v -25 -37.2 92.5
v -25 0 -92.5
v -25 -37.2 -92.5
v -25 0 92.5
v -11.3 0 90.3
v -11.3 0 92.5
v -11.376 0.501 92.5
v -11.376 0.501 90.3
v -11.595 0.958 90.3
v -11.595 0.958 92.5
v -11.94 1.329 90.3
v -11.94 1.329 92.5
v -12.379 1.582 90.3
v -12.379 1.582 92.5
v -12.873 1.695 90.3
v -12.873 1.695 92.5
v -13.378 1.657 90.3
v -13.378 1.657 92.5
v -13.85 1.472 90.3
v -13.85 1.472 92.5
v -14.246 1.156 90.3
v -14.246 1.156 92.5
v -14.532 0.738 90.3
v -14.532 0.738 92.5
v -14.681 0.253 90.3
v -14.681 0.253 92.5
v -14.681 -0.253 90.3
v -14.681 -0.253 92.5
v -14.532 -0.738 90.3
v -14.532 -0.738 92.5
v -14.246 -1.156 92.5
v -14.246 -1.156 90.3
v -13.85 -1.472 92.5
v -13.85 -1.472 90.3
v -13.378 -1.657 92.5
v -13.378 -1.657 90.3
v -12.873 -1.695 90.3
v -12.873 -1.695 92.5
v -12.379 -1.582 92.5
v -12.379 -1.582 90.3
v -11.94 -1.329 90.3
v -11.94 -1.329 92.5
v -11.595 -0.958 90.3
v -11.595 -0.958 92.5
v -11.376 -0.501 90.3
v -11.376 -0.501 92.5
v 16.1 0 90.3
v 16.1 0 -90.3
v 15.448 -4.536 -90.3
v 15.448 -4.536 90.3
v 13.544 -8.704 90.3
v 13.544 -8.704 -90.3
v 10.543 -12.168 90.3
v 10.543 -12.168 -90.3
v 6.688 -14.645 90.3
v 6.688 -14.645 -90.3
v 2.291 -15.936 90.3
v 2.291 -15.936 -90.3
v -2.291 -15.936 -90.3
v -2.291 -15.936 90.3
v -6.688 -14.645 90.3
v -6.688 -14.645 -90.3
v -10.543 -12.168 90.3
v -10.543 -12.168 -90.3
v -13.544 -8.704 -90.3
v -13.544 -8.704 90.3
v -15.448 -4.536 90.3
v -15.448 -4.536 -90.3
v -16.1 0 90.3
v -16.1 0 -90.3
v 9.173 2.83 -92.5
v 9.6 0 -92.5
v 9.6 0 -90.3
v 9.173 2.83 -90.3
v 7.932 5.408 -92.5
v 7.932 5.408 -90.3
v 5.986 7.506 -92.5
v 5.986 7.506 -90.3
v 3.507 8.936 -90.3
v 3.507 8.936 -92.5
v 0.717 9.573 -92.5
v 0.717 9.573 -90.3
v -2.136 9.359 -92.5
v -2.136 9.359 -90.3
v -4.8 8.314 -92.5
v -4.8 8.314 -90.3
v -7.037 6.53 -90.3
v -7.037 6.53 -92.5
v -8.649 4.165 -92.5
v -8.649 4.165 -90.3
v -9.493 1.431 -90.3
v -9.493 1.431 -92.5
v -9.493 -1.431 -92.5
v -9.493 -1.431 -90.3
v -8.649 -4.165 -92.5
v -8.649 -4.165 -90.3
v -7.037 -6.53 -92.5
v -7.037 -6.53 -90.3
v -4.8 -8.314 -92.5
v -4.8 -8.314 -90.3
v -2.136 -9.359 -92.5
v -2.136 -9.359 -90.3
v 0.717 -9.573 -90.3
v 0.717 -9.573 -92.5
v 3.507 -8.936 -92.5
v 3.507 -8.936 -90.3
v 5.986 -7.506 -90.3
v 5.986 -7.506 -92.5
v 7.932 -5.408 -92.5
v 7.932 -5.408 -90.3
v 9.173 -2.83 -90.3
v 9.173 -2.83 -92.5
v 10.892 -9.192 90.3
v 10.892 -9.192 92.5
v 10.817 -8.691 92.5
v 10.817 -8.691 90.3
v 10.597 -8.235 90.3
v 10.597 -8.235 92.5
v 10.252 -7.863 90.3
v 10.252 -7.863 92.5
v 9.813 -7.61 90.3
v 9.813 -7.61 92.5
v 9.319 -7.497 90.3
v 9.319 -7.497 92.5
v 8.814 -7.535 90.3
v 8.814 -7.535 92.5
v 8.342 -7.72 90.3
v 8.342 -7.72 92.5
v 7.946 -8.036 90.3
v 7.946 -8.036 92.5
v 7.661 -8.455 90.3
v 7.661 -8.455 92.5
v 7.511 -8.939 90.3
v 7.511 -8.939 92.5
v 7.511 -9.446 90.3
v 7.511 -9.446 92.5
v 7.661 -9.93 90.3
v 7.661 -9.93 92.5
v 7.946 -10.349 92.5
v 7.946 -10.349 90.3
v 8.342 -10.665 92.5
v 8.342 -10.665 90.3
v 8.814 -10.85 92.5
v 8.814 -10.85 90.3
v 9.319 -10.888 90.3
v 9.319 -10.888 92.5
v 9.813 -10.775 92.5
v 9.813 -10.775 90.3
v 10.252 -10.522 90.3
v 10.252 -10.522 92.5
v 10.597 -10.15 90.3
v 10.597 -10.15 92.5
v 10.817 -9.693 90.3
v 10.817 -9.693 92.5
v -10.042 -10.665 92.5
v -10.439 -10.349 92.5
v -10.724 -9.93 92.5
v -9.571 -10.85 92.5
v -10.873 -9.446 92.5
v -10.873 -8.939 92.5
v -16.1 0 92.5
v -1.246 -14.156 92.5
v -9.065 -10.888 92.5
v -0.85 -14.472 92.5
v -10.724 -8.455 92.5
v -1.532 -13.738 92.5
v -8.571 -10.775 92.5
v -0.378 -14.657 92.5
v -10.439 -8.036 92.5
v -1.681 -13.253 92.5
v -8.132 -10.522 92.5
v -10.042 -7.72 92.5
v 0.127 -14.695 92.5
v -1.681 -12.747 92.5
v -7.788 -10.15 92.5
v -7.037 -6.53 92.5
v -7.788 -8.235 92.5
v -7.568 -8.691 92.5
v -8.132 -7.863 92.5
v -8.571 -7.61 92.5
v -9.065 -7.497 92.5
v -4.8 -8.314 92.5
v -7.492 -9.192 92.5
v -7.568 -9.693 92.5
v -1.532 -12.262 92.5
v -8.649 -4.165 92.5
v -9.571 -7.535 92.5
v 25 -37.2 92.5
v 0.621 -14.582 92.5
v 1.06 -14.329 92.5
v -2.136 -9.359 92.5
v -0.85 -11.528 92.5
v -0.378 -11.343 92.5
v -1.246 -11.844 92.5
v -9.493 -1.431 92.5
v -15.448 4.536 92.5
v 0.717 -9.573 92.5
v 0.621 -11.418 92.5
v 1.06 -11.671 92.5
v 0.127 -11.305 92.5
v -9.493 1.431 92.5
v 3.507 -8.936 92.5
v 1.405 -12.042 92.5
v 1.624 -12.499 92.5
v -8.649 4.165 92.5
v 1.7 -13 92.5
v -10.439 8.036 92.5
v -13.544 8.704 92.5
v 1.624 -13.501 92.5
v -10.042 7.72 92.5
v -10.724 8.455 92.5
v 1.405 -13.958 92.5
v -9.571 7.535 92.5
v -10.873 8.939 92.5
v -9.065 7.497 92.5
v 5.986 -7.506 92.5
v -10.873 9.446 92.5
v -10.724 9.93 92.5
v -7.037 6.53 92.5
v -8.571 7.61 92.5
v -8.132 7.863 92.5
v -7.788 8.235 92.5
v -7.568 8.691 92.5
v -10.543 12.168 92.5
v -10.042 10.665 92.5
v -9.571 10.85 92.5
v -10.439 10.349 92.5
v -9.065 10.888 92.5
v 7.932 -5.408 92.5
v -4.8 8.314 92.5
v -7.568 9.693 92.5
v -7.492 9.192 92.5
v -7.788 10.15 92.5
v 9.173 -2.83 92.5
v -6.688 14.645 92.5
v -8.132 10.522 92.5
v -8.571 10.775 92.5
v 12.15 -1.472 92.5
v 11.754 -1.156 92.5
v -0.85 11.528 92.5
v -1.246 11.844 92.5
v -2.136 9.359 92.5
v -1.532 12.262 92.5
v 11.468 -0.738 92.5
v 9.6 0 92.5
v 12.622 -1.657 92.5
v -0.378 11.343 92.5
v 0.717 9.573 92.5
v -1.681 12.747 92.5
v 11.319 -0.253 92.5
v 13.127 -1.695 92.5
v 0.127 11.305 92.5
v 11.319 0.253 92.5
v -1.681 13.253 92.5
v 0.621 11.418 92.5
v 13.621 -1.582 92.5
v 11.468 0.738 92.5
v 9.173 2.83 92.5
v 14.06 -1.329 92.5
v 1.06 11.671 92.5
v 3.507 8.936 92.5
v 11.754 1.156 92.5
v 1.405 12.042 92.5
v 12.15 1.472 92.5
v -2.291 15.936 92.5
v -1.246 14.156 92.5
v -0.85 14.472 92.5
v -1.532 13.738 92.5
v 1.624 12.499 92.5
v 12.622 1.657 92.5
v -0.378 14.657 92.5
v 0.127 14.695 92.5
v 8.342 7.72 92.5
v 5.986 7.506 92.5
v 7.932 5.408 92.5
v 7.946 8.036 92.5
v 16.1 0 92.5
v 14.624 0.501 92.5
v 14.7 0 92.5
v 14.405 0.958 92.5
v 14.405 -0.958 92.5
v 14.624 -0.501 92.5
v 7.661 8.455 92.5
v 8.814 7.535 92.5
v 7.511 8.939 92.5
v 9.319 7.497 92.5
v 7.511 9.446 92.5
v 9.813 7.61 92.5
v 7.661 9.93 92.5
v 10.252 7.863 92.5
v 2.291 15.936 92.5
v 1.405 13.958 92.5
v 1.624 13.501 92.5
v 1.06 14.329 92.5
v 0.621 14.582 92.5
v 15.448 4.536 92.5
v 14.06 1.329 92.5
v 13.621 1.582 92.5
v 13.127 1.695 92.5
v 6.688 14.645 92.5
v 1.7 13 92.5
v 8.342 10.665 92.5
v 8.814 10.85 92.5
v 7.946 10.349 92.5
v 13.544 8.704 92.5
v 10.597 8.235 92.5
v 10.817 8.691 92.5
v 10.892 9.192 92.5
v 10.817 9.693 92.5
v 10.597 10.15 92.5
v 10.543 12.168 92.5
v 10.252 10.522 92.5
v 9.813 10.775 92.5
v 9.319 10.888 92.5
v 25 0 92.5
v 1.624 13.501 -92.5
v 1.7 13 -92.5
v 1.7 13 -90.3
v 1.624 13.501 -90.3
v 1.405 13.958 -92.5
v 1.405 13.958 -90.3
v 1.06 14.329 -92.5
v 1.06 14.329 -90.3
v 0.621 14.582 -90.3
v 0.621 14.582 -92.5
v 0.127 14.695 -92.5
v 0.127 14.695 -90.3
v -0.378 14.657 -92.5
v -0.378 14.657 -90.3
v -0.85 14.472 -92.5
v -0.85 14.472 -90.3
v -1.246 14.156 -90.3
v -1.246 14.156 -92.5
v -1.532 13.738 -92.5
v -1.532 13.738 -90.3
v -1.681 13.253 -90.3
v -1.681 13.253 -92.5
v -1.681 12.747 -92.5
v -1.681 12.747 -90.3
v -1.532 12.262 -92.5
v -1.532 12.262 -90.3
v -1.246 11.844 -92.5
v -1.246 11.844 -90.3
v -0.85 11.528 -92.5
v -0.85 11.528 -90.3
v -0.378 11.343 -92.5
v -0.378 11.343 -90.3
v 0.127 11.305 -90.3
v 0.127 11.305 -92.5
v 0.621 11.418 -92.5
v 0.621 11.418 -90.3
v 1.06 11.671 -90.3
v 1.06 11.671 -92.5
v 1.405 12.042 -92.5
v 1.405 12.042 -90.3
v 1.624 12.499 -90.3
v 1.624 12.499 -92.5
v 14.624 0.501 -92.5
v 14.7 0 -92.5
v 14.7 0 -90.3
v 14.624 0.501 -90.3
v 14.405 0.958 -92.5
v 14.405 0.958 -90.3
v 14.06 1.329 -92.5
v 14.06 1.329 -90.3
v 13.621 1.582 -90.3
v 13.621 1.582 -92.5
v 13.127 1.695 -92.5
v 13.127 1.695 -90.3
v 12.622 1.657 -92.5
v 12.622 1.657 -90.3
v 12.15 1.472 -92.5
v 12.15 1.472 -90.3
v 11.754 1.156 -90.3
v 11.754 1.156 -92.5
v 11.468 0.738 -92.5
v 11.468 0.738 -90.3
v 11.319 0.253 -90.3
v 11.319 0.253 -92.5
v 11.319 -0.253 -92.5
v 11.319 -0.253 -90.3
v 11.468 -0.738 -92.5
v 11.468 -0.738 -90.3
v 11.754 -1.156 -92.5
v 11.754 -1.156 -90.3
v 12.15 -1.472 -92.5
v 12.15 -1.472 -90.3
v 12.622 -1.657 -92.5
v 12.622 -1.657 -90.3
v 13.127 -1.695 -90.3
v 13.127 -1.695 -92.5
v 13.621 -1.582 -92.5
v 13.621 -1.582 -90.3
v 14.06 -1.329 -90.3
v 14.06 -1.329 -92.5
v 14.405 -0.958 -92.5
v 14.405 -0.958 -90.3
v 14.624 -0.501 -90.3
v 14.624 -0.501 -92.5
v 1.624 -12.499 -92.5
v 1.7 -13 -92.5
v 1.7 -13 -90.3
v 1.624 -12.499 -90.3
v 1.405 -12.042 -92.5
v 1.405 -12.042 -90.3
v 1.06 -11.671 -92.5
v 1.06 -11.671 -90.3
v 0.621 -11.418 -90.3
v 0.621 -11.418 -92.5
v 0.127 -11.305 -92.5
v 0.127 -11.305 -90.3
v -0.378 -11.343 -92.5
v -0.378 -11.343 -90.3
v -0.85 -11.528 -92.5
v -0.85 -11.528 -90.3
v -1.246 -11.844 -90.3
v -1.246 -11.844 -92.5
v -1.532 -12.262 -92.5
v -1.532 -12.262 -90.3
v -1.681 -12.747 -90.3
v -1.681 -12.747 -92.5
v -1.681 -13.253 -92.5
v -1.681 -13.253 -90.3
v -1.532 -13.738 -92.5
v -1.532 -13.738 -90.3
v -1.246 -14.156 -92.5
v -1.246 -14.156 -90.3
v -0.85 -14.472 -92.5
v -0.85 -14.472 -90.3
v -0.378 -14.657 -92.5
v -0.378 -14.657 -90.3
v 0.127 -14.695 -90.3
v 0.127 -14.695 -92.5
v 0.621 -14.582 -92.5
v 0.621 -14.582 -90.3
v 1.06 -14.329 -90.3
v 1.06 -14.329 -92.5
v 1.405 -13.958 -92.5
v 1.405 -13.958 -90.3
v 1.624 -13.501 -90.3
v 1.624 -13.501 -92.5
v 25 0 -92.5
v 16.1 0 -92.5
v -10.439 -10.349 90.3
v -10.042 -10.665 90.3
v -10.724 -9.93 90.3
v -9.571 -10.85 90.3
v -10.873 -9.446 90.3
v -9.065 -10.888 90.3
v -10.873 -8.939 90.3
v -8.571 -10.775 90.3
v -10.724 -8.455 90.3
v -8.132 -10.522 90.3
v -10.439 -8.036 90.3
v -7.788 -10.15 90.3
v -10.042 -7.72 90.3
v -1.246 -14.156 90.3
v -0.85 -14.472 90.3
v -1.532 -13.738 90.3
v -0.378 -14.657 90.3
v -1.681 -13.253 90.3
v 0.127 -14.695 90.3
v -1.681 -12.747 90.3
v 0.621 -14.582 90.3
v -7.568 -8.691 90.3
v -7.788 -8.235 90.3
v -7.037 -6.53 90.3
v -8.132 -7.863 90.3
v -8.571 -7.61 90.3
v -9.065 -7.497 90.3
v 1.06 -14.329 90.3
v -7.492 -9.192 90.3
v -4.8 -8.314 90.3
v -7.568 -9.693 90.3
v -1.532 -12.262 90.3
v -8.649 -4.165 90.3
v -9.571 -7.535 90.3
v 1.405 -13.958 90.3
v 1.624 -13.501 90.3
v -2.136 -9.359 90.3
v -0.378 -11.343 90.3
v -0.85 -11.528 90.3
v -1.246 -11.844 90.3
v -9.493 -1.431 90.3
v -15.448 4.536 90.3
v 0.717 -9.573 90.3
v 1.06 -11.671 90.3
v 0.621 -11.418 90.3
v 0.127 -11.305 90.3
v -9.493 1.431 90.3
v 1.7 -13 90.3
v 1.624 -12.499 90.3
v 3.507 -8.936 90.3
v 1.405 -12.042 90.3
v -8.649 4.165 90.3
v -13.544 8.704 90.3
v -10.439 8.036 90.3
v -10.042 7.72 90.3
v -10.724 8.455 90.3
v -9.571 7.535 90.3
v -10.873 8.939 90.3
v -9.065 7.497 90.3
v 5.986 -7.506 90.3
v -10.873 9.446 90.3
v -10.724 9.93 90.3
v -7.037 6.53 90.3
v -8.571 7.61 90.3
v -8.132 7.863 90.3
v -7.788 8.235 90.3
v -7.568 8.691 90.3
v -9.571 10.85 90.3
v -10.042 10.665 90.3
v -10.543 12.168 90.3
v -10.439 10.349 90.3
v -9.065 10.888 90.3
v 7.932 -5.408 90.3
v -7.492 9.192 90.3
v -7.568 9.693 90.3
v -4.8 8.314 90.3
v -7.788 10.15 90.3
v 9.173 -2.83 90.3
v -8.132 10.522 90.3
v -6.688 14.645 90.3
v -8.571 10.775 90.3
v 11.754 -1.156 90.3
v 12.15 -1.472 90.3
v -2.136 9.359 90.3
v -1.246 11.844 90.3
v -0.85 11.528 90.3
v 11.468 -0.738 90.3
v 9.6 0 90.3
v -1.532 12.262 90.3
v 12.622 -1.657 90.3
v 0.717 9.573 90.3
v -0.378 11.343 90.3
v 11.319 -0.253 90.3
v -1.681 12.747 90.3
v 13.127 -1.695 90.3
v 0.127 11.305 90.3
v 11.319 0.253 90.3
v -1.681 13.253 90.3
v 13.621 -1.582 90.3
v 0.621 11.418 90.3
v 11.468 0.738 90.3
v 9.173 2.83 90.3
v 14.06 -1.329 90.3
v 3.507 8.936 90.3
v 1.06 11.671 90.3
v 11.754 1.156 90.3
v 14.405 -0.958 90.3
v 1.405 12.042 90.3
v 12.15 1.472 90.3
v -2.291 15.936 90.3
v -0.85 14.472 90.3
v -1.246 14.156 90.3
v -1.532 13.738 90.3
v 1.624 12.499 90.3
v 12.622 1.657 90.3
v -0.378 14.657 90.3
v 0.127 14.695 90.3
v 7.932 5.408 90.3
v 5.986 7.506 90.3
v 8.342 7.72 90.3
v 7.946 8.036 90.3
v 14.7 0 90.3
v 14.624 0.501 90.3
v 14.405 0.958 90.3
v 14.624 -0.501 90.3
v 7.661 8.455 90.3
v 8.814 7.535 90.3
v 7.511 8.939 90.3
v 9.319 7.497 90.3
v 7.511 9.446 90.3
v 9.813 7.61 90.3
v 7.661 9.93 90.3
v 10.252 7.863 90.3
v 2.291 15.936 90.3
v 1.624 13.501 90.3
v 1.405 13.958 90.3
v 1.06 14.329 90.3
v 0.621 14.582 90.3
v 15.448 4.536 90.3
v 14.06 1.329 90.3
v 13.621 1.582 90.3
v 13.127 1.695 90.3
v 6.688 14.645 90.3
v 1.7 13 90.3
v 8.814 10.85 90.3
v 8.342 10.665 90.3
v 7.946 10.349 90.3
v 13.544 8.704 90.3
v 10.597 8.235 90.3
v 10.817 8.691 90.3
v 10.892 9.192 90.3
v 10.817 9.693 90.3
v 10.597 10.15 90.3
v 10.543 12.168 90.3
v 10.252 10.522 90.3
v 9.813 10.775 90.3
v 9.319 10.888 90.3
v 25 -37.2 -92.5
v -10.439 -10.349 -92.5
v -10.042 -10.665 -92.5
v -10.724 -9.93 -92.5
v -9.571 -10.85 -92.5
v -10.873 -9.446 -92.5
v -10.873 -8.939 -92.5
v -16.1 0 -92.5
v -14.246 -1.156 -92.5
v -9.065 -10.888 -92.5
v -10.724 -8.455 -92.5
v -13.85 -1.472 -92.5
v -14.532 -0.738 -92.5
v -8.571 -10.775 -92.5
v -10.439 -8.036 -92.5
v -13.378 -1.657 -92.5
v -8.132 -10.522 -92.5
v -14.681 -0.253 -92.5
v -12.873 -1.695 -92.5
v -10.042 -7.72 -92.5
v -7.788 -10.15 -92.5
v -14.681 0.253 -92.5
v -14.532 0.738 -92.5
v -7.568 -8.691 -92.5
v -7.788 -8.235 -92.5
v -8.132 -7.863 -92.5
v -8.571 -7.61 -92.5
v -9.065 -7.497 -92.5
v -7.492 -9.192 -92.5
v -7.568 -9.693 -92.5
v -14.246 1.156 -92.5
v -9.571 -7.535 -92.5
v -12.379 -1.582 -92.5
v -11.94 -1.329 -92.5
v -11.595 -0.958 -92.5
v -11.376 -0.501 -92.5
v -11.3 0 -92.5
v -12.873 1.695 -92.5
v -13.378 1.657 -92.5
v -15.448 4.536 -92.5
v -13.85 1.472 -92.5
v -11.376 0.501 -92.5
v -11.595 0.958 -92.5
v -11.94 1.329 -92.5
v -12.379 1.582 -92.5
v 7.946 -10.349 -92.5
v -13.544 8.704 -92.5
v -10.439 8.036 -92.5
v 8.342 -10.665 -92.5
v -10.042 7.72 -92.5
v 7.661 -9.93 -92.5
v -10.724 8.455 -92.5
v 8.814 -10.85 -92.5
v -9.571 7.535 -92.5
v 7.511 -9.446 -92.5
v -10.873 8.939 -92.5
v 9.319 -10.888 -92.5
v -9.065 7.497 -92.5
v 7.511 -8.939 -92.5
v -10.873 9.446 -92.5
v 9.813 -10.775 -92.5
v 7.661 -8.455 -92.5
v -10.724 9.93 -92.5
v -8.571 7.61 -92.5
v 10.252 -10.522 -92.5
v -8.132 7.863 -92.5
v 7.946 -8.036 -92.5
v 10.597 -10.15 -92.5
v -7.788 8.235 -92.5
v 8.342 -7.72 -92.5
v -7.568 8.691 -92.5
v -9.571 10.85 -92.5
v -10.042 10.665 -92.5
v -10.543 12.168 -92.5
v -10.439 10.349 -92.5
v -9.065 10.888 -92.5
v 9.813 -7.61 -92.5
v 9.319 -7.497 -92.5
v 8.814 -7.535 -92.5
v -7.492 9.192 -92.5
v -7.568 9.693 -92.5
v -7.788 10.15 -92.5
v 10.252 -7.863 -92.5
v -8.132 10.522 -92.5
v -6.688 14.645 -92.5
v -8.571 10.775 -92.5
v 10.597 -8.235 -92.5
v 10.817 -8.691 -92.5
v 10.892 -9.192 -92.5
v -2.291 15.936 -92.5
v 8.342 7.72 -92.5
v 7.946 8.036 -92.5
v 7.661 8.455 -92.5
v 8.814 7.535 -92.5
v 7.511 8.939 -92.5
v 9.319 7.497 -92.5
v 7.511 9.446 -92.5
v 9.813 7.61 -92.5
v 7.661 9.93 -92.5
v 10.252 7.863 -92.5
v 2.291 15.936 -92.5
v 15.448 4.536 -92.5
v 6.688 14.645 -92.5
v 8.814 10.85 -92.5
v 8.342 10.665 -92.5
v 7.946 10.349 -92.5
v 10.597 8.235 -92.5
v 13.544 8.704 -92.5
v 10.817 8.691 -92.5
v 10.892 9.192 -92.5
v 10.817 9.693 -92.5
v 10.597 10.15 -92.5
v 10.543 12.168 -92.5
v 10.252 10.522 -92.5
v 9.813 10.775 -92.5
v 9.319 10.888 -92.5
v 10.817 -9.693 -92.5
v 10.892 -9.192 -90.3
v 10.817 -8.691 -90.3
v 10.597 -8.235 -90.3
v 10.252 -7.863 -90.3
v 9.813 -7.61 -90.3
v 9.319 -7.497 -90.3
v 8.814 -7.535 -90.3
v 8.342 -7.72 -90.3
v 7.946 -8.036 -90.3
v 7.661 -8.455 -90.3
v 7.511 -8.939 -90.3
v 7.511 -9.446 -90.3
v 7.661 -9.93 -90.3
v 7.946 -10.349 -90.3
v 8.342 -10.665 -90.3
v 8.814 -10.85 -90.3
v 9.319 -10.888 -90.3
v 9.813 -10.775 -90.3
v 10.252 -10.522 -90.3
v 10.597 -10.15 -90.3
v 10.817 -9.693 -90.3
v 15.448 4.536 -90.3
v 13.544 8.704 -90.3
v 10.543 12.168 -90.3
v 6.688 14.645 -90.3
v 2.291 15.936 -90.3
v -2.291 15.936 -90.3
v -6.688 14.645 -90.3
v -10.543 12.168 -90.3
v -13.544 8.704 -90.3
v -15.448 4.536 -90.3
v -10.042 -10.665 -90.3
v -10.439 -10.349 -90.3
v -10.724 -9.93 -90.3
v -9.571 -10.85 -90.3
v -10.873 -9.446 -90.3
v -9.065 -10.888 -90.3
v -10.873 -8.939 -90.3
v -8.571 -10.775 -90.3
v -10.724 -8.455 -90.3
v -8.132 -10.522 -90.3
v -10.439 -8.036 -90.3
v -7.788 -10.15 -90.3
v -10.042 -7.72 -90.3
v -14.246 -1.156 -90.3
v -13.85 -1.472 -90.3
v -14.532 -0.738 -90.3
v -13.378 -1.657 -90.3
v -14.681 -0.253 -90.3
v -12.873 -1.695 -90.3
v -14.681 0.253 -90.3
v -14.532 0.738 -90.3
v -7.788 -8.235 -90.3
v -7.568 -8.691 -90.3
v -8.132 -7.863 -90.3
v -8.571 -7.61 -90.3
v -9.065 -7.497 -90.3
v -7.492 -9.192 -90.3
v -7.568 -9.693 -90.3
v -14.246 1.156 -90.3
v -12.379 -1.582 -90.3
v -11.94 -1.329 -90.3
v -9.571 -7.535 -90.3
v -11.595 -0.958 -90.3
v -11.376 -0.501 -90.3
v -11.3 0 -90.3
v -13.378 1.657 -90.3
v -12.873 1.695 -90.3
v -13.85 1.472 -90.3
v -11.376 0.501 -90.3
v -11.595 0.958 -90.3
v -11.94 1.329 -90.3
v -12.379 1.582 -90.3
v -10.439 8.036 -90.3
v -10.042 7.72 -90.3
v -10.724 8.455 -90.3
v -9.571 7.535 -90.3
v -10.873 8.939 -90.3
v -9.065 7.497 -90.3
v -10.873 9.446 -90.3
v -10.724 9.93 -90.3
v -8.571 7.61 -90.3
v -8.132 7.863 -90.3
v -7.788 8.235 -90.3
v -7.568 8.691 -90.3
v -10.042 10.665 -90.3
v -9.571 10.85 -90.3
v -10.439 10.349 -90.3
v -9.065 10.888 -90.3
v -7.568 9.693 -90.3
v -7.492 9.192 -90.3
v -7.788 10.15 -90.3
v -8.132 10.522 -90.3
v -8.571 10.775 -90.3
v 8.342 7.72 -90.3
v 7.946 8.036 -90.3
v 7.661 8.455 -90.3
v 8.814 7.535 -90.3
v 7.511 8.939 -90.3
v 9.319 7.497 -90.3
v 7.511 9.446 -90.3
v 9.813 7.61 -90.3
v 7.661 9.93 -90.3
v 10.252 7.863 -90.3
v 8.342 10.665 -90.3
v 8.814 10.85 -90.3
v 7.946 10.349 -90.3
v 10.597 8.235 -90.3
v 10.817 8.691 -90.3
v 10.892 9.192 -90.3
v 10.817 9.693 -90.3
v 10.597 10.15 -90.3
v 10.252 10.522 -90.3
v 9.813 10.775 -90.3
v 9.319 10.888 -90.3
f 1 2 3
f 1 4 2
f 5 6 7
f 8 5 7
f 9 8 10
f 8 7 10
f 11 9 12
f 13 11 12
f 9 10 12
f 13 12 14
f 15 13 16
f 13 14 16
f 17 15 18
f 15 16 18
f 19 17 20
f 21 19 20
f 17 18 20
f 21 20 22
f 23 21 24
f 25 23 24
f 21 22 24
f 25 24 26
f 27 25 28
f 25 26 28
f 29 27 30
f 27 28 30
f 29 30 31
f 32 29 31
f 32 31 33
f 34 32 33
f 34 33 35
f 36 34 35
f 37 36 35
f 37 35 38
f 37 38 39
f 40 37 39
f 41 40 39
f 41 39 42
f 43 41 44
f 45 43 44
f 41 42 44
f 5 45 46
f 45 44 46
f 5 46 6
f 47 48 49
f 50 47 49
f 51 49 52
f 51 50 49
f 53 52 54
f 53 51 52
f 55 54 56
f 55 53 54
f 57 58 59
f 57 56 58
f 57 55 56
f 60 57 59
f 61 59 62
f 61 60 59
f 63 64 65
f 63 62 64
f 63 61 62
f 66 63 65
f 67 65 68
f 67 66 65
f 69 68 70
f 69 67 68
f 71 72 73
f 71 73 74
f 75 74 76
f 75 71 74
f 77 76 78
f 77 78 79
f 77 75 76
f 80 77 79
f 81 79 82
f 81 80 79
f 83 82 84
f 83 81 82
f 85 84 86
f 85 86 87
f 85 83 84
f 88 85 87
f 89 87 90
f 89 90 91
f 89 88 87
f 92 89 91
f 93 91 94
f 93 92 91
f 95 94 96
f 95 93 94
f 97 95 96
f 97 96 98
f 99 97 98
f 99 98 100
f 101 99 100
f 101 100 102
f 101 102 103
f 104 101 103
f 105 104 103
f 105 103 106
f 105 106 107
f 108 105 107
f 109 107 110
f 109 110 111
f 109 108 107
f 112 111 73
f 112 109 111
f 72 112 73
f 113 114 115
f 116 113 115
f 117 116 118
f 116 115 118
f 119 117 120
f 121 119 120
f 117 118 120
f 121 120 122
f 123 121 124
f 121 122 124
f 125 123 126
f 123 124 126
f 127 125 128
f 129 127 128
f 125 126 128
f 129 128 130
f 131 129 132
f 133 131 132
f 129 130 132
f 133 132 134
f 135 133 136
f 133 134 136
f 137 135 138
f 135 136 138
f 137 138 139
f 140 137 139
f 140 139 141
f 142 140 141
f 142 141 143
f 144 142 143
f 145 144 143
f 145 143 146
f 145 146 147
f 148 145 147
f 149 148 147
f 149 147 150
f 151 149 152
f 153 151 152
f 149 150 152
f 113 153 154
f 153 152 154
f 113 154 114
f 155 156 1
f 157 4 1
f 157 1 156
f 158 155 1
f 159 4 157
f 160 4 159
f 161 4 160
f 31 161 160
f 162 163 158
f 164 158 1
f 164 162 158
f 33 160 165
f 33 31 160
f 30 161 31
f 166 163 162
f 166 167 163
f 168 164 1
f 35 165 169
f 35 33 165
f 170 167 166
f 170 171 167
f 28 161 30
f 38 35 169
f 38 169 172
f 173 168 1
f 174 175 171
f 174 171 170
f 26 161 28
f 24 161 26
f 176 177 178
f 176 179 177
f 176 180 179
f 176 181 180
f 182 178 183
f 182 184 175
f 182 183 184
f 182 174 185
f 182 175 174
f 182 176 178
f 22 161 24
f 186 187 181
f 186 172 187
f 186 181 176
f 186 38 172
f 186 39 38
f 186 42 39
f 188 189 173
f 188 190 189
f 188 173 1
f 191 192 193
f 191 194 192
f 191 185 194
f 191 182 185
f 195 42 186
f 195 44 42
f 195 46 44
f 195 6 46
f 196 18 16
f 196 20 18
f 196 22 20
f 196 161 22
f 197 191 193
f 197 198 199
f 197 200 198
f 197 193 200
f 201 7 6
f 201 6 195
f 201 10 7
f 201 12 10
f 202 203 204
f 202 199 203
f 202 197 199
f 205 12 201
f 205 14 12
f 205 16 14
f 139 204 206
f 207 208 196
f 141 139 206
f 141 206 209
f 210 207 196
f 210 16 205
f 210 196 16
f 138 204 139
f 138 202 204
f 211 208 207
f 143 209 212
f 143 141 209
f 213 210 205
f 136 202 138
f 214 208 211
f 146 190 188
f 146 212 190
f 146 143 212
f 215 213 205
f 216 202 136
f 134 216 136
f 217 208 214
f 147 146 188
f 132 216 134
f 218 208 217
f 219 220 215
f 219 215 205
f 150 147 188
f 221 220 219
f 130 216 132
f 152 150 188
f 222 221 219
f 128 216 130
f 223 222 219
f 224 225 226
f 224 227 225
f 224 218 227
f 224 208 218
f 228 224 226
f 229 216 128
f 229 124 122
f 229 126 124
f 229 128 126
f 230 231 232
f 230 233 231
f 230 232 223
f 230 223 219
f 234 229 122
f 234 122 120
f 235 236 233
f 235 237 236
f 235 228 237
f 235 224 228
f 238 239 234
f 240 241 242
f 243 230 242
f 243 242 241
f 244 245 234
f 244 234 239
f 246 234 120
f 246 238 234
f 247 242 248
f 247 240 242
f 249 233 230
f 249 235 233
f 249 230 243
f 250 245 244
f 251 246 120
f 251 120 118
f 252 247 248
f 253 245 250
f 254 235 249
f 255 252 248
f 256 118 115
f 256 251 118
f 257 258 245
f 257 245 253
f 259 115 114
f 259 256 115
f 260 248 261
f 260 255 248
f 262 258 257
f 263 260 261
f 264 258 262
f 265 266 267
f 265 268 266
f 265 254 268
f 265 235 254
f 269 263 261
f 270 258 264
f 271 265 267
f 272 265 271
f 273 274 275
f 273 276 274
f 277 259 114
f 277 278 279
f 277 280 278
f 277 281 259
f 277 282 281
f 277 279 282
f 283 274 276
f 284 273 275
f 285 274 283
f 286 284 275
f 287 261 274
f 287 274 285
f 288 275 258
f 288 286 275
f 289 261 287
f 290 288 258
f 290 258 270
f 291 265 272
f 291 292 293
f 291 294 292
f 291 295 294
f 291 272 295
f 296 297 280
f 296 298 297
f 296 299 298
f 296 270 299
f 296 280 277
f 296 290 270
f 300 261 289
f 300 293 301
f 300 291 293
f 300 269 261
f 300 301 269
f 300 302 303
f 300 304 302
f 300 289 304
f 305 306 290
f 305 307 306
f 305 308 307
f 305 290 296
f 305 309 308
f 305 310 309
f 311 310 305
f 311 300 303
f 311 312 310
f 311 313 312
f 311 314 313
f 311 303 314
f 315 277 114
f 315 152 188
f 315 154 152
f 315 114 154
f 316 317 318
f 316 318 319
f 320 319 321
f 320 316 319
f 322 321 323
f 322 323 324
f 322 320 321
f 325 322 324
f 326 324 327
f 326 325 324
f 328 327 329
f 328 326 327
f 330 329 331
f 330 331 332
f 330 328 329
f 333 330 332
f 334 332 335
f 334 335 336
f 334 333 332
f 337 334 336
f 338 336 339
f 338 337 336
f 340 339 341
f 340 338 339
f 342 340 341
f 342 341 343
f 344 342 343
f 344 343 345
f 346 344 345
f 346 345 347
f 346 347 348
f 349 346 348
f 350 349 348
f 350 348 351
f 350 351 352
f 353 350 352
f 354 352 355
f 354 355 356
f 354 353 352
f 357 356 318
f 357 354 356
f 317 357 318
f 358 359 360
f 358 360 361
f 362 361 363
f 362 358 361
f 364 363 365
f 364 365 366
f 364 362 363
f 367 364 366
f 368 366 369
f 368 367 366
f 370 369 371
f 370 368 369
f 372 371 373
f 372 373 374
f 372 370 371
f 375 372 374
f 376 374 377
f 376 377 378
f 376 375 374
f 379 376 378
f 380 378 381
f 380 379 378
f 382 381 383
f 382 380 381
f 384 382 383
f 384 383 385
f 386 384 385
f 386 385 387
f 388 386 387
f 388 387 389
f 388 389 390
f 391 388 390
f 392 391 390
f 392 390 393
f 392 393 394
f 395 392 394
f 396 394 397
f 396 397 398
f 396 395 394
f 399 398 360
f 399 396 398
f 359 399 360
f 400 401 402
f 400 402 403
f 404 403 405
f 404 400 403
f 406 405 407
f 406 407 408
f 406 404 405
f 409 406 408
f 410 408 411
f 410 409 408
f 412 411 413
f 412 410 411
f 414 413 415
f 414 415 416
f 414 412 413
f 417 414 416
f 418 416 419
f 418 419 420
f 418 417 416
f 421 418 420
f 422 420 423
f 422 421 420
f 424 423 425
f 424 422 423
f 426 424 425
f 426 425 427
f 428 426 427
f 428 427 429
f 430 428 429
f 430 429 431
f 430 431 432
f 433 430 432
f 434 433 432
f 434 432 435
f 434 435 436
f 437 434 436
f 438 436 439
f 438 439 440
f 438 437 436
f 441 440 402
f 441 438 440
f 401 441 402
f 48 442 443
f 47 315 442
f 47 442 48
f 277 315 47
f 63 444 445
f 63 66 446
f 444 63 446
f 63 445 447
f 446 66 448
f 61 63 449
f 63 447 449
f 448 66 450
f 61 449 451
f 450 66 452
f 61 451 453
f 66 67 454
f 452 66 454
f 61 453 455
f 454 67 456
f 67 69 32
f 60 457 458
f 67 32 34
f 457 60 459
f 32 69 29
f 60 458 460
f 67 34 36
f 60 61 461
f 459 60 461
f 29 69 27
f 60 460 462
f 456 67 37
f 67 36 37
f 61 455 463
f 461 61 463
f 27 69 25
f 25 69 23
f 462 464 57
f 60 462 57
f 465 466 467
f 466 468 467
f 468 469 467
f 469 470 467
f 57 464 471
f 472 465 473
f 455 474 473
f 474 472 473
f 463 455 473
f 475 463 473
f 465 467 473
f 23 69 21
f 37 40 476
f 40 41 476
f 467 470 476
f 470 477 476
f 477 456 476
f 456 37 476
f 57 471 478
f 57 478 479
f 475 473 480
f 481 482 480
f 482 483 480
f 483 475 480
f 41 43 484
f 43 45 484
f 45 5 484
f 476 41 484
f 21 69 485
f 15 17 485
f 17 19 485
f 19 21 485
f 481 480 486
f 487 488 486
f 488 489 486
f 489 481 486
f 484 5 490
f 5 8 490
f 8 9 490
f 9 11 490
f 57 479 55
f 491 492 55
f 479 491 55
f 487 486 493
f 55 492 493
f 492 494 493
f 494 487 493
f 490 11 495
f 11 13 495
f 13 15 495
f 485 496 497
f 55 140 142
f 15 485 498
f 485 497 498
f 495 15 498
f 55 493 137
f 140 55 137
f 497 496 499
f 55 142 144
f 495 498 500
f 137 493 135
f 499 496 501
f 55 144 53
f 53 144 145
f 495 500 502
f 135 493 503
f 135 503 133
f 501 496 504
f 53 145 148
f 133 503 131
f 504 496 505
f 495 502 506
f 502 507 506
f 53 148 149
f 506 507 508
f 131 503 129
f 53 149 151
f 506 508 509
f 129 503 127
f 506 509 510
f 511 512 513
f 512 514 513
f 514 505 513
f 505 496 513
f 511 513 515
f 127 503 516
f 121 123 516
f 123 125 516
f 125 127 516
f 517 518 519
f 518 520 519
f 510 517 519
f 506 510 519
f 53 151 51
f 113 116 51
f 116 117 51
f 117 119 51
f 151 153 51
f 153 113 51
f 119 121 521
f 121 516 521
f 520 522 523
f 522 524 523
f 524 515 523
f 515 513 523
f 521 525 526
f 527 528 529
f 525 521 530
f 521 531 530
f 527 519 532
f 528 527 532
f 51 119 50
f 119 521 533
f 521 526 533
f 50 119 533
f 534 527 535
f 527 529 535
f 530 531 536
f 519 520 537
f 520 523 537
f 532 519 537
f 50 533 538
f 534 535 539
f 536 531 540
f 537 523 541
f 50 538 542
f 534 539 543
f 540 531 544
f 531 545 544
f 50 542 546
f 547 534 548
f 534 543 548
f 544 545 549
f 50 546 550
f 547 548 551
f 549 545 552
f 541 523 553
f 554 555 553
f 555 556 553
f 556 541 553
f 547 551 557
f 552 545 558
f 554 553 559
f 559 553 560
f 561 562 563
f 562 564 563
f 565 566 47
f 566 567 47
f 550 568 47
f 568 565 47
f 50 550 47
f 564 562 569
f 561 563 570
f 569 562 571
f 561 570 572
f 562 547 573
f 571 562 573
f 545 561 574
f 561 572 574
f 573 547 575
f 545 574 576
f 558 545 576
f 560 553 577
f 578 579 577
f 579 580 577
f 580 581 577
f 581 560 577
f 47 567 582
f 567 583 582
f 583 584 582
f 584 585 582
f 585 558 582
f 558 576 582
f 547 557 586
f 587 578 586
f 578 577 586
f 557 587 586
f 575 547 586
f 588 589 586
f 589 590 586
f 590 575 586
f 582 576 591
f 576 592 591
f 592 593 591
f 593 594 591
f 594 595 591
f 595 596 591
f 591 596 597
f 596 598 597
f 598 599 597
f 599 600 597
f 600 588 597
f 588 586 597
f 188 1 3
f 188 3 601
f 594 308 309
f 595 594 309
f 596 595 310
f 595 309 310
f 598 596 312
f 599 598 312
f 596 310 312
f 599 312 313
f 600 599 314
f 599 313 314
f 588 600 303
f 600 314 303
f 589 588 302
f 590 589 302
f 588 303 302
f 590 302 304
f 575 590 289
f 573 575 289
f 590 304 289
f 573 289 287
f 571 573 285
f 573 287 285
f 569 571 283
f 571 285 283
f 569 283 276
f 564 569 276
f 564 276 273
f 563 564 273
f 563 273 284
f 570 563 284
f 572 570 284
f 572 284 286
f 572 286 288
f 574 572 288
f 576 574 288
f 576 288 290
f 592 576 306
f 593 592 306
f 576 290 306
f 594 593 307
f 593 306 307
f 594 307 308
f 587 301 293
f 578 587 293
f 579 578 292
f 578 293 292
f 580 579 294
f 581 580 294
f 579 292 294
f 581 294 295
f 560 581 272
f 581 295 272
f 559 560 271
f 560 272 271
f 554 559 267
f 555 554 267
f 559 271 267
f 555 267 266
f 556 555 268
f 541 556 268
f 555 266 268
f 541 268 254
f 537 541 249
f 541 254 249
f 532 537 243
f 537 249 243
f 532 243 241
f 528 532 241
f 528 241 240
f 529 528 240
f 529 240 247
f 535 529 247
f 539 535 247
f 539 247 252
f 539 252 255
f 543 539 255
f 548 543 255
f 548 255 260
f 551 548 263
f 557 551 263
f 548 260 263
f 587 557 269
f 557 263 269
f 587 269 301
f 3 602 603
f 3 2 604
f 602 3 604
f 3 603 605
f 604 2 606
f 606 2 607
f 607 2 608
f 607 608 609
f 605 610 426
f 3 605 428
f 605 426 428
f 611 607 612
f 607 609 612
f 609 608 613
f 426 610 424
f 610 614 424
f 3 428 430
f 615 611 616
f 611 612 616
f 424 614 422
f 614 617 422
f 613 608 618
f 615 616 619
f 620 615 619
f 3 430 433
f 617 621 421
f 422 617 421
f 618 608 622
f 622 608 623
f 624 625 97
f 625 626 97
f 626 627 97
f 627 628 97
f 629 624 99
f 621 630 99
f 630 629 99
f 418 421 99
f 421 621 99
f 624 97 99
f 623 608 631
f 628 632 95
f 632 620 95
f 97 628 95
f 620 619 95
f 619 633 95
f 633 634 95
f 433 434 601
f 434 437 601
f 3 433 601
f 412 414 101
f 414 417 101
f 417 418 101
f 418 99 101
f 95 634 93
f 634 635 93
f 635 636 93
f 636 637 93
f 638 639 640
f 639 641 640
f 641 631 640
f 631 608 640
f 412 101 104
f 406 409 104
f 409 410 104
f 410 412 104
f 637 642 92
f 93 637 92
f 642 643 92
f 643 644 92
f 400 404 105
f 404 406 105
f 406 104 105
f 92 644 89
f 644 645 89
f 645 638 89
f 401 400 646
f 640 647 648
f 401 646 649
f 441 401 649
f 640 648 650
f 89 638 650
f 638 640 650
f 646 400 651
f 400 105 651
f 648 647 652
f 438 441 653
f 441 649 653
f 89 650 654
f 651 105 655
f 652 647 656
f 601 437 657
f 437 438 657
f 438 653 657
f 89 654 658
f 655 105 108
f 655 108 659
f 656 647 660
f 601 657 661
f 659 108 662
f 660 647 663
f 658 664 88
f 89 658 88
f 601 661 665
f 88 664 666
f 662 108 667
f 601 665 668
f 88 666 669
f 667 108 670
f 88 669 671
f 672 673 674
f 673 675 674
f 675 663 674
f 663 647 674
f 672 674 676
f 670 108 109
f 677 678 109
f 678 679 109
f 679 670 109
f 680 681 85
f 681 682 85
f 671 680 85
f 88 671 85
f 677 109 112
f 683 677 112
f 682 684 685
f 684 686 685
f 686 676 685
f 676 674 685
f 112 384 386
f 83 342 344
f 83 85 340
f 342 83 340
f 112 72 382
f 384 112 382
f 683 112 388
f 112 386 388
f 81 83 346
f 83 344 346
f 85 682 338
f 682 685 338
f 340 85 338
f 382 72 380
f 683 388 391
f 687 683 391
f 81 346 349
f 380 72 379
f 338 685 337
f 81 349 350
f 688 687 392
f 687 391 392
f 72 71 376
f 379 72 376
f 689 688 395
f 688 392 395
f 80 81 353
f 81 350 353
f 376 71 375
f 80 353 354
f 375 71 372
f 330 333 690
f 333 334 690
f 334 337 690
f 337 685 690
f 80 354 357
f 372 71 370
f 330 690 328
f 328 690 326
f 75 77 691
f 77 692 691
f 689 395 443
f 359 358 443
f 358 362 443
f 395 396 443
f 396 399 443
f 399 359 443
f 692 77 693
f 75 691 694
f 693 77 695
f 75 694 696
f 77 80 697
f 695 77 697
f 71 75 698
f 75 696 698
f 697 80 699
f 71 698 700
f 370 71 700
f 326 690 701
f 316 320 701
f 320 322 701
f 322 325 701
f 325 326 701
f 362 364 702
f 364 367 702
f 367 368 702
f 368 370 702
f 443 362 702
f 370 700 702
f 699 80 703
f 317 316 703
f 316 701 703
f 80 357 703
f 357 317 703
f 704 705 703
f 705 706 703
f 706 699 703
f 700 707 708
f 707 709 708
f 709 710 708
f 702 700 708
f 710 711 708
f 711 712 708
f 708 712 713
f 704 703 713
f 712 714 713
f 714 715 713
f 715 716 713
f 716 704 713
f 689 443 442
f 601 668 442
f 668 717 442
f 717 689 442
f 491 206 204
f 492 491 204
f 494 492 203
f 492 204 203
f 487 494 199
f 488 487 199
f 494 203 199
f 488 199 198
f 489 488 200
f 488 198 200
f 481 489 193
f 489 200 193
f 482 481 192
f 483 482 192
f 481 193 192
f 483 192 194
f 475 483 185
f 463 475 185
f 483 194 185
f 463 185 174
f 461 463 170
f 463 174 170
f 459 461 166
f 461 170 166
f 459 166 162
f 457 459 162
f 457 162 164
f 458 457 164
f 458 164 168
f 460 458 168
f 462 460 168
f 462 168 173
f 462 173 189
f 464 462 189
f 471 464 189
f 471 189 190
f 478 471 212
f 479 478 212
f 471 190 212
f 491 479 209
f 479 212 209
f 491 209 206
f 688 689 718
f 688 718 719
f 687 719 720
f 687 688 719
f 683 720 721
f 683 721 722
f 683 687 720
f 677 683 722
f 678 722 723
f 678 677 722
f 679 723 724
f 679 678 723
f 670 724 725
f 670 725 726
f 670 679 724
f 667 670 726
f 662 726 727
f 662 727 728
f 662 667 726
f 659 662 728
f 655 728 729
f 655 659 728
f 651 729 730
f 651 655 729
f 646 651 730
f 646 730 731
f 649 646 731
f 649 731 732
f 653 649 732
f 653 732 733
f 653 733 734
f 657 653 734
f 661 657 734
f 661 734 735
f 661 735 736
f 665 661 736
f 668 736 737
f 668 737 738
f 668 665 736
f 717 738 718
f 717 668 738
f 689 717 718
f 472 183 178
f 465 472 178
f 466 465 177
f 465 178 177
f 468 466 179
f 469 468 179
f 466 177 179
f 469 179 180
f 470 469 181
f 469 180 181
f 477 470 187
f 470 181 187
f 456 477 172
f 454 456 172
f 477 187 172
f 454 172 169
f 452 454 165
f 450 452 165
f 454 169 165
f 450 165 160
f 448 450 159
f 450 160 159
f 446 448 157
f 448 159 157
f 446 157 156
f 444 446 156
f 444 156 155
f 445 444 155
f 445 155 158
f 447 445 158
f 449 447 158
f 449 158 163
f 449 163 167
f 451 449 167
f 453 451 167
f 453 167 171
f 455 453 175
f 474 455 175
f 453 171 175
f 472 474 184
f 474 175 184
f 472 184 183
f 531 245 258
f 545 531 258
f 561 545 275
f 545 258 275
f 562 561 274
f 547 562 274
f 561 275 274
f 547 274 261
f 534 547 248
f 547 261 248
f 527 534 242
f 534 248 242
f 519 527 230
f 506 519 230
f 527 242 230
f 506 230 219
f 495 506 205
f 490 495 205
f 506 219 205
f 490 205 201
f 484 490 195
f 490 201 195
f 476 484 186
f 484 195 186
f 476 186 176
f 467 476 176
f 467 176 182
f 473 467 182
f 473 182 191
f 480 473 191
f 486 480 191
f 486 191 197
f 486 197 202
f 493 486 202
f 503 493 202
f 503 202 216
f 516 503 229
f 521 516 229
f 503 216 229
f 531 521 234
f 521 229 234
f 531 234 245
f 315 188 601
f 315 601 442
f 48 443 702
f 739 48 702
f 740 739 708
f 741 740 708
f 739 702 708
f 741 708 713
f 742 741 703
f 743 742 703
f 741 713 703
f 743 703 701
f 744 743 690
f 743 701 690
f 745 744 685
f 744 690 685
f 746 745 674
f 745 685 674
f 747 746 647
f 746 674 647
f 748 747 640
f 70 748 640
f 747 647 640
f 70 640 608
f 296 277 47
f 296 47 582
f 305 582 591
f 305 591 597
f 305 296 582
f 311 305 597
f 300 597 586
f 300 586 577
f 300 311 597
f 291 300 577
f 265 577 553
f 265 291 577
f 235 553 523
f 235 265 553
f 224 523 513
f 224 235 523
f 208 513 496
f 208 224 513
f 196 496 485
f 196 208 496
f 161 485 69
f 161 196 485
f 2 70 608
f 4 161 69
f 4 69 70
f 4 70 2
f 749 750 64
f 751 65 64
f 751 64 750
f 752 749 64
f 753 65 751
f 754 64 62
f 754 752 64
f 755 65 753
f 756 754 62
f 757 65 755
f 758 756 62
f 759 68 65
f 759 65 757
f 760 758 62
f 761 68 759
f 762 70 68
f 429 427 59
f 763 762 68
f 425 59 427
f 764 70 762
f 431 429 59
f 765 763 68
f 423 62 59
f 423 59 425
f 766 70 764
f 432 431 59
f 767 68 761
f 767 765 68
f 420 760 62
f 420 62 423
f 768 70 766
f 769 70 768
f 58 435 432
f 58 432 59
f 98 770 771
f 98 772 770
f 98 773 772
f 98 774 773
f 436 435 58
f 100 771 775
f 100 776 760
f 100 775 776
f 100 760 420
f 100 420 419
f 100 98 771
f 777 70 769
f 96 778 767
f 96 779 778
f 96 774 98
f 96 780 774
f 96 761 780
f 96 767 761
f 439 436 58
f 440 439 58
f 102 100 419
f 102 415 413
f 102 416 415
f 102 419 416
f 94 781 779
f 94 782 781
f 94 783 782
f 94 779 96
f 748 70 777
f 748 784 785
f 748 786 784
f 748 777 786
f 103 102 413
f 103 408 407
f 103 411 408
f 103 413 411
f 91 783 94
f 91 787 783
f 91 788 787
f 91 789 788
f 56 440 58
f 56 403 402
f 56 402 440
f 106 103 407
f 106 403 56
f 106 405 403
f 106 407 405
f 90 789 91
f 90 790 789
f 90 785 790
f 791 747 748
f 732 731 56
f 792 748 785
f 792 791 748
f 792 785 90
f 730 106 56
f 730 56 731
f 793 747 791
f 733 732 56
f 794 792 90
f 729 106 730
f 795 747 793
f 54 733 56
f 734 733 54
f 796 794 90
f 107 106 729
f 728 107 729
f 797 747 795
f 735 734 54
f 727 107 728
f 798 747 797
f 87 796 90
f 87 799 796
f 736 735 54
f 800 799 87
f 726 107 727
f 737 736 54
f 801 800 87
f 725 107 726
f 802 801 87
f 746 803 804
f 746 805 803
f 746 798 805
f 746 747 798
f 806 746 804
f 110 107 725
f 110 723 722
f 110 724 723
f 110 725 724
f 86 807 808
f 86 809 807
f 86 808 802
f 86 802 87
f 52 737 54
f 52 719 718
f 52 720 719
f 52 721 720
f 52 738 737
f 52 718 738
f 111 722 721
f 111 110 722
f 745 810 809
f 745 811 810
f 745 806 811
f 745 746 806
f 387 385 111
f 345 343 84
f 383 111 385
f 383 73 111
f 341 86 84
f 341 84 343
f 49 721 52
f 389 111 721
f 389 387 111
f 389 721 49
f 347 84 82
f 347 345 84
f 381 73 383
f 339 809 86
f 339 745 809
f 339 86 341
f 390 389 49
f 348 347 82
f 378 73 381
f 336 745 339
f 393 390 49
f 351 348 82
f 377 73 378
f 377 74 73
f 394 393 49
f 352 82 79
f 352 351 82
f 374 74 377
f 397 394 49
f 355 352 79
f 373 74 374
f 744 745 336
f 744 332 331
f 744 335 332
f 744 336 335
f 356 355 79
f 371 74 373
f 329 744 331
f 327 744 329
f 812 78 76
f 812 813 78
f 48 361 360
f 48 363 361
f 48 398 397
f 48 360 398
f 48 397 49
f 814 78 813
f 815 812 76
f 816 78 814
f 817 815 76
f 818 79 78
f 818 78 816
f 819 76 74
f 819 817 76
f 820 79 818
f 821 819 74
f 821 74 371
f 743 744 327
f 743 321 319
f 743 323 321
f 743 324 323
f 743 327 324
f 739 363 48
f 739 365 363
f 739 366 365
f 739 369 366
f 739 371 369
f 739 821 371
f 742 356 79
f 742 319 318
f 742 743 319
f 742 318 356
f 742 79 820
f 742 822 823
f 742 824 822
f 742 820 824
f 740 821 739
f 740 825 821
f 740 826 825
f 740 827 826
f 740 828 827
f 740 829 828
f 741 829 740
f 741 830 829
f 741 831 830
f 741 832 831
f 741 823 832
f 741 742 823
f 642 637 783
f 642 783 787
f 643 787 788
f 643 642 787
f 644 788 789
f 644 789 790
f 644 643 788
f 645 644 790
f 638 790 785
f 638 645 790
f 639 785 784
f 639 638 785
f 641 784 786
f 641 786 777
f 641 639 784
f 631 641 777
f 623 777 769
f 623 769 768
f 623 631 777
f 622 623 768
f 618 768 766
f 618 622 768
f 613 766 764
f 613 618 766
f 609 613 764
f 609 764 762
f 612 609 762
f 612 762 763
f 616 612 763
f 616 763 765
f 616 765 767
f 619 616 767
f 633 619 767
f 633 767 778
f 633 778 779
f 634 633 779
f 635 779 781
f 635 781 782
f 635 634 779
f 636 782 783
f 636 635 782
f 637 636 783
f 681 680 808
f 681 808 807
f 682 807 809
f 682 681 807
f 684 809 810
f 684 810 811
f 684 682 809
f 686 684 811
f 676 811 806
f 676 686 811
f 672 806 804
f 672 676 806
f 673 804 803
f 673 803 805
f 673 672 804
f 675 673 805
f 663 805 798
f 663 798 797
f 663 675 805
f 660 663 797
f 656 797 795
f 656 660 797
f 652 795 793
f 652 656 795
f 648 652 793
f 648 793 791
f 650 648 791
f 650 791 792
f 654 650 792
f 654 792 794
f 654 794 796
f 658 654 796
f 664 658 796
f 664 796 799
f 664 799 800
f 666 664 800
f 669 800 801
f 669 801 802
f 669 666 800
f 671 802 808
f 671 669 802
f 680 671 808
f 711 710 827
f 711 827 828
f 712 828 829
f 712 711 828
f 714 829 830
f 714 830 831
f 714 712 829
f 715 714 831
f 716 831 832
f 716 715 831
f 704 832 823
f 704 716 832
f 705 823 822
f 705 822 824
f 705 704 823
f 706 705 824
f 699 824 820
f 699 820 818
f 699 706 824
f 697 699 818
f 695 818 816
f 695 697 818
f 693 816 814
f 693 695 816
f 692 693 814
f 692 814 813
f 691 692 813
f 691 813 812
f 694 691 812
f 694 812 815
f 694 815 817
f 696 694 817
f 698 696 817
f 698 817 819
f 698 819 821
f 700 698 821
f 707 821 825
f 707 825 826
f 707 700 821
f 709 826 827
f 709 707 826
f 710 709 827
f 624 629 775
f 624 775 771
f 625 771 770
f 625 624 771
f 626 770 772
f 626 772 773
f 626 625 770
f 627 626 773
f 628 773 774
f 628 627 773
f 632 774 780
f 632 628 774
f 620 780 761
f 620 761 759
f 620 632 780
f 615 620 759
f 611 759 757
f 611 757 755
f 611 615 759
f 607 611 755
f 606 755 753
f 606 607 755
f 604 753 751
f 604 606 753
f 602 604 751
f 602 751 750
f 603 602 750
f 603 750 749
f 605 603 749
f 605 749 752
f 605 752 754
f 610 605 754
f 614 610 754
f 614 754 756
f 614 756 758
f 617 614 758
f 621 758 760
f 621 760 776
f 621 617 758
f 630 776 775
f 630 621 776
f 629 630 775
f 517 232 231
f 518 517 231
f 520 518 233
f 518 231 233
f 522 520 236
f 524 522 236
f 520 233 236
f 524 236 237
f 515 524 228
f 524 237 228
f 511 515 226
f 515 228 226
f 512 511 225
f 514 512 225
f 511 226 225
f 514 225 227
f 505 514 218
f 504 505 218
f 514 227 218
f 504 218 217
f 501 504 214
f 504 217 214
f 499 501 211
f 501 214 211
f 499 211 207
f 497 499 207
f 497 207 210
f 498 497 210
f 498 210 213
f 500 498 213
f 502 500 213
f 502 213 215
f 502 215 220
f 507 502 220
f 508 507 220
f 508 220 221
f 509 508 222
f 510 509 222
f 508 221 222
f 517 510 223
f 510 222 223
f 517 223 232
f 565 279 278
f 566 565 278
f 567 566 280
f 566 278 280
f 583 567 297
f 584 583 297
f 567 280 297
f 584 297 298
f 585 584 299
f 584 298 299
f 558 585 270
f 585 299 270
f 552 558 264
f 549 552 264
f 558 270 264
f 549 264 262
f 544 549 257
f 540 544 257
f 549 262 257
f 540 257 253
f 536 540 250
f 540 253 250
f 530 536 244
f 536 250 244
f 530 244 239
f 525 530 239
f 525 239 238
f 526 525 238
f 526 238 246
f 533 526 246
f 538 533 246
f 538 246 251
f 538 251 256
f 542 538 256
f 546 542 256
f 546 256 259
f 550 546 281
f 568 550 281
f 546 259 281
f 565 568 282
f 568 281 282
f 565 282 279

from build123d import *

# Parameters (mm, degrees)
BOSS_EXTRU_1_DEPTH = 92.5
ESQUISSE2_R        = 16.1
ESQUISSE2_R_2      = 1.7
ESQUISSE2_R_3      = 9.6
BOSS_EXTRU_2_DEPTH = 2.2


with BuildPart() as part:
    # Esquisse1 → Boss.-Extru.1 (new body, symmetric)
    with BuildSketch(Plane.XY):
        with BuildLine():
            Line((-25, 0), (-25, -37.200306763))
            Line((-25, -37.200306763), (25, -37.200306763))
            Line((25, -37.200306763), (25, 0))
            Line((25, 0), (16.1, 0))
            ThreePointArc((16.1, 0), (0, -16.1), (-16.1, 0))
            Line((-16.1, 0), (-25, 0))
        make_face()
    extrude(amount=BOSS_EXTRU_1_DEPTH, both=True)

    # Esquisse2 → Boss.-Extru.2 (add)
    with BuildSketch(Plane.XY.offset(92.5)):
        Circle(ESQUISSE2_R)
        with Locations((0, 13)):
            Circle(ESQUISSE2_R_2, mode=Mode.SUBTRACT)
        Circle(ESQUISSE2_R_3, mode=Mode.SUBTRACT)
        with Locations((9.192388155, 9.192388155)):
            Circle(ESQUISSE2_R_2, mode=Mode.SUBTRACT)
        with Locations((13, 0)):
            Circle(ESQUISSE2_R_2, mode=Mode.SUBTRACT)
        with Locations((9.192388155, -9.192388155)):
            Circle(ESQUISSE2_R_2, mode=Mode.SUBTRACT)
        with Locations((0, -13)):
            Circle(ESQUISSE2_R_2, mode=Mode.SUBTRACT)
        with Locations((-9.192388155, -9.192388155)):
            Circle(ESQUISSE2_R_2, mode=Mode.SUBTRACT)
        with Locations((-13, 0)):
            Circle(ESQUISSE2_R_2, mode=Mode.SUBTRACT)
        with Locations((-9.192388155, 9.192388155)):
            Circle(ESQUISSE2_R_2, mode=Mode.SUBTRACT)
    boss_extru_2 = extrude(amount=-BOSS_EXTRU_2_DEPTH)

    # Symétrie1: Boss.-Extru.2 across plane
    add(boss_extru_2.mirror(Plane.XY))


solid = part.part
